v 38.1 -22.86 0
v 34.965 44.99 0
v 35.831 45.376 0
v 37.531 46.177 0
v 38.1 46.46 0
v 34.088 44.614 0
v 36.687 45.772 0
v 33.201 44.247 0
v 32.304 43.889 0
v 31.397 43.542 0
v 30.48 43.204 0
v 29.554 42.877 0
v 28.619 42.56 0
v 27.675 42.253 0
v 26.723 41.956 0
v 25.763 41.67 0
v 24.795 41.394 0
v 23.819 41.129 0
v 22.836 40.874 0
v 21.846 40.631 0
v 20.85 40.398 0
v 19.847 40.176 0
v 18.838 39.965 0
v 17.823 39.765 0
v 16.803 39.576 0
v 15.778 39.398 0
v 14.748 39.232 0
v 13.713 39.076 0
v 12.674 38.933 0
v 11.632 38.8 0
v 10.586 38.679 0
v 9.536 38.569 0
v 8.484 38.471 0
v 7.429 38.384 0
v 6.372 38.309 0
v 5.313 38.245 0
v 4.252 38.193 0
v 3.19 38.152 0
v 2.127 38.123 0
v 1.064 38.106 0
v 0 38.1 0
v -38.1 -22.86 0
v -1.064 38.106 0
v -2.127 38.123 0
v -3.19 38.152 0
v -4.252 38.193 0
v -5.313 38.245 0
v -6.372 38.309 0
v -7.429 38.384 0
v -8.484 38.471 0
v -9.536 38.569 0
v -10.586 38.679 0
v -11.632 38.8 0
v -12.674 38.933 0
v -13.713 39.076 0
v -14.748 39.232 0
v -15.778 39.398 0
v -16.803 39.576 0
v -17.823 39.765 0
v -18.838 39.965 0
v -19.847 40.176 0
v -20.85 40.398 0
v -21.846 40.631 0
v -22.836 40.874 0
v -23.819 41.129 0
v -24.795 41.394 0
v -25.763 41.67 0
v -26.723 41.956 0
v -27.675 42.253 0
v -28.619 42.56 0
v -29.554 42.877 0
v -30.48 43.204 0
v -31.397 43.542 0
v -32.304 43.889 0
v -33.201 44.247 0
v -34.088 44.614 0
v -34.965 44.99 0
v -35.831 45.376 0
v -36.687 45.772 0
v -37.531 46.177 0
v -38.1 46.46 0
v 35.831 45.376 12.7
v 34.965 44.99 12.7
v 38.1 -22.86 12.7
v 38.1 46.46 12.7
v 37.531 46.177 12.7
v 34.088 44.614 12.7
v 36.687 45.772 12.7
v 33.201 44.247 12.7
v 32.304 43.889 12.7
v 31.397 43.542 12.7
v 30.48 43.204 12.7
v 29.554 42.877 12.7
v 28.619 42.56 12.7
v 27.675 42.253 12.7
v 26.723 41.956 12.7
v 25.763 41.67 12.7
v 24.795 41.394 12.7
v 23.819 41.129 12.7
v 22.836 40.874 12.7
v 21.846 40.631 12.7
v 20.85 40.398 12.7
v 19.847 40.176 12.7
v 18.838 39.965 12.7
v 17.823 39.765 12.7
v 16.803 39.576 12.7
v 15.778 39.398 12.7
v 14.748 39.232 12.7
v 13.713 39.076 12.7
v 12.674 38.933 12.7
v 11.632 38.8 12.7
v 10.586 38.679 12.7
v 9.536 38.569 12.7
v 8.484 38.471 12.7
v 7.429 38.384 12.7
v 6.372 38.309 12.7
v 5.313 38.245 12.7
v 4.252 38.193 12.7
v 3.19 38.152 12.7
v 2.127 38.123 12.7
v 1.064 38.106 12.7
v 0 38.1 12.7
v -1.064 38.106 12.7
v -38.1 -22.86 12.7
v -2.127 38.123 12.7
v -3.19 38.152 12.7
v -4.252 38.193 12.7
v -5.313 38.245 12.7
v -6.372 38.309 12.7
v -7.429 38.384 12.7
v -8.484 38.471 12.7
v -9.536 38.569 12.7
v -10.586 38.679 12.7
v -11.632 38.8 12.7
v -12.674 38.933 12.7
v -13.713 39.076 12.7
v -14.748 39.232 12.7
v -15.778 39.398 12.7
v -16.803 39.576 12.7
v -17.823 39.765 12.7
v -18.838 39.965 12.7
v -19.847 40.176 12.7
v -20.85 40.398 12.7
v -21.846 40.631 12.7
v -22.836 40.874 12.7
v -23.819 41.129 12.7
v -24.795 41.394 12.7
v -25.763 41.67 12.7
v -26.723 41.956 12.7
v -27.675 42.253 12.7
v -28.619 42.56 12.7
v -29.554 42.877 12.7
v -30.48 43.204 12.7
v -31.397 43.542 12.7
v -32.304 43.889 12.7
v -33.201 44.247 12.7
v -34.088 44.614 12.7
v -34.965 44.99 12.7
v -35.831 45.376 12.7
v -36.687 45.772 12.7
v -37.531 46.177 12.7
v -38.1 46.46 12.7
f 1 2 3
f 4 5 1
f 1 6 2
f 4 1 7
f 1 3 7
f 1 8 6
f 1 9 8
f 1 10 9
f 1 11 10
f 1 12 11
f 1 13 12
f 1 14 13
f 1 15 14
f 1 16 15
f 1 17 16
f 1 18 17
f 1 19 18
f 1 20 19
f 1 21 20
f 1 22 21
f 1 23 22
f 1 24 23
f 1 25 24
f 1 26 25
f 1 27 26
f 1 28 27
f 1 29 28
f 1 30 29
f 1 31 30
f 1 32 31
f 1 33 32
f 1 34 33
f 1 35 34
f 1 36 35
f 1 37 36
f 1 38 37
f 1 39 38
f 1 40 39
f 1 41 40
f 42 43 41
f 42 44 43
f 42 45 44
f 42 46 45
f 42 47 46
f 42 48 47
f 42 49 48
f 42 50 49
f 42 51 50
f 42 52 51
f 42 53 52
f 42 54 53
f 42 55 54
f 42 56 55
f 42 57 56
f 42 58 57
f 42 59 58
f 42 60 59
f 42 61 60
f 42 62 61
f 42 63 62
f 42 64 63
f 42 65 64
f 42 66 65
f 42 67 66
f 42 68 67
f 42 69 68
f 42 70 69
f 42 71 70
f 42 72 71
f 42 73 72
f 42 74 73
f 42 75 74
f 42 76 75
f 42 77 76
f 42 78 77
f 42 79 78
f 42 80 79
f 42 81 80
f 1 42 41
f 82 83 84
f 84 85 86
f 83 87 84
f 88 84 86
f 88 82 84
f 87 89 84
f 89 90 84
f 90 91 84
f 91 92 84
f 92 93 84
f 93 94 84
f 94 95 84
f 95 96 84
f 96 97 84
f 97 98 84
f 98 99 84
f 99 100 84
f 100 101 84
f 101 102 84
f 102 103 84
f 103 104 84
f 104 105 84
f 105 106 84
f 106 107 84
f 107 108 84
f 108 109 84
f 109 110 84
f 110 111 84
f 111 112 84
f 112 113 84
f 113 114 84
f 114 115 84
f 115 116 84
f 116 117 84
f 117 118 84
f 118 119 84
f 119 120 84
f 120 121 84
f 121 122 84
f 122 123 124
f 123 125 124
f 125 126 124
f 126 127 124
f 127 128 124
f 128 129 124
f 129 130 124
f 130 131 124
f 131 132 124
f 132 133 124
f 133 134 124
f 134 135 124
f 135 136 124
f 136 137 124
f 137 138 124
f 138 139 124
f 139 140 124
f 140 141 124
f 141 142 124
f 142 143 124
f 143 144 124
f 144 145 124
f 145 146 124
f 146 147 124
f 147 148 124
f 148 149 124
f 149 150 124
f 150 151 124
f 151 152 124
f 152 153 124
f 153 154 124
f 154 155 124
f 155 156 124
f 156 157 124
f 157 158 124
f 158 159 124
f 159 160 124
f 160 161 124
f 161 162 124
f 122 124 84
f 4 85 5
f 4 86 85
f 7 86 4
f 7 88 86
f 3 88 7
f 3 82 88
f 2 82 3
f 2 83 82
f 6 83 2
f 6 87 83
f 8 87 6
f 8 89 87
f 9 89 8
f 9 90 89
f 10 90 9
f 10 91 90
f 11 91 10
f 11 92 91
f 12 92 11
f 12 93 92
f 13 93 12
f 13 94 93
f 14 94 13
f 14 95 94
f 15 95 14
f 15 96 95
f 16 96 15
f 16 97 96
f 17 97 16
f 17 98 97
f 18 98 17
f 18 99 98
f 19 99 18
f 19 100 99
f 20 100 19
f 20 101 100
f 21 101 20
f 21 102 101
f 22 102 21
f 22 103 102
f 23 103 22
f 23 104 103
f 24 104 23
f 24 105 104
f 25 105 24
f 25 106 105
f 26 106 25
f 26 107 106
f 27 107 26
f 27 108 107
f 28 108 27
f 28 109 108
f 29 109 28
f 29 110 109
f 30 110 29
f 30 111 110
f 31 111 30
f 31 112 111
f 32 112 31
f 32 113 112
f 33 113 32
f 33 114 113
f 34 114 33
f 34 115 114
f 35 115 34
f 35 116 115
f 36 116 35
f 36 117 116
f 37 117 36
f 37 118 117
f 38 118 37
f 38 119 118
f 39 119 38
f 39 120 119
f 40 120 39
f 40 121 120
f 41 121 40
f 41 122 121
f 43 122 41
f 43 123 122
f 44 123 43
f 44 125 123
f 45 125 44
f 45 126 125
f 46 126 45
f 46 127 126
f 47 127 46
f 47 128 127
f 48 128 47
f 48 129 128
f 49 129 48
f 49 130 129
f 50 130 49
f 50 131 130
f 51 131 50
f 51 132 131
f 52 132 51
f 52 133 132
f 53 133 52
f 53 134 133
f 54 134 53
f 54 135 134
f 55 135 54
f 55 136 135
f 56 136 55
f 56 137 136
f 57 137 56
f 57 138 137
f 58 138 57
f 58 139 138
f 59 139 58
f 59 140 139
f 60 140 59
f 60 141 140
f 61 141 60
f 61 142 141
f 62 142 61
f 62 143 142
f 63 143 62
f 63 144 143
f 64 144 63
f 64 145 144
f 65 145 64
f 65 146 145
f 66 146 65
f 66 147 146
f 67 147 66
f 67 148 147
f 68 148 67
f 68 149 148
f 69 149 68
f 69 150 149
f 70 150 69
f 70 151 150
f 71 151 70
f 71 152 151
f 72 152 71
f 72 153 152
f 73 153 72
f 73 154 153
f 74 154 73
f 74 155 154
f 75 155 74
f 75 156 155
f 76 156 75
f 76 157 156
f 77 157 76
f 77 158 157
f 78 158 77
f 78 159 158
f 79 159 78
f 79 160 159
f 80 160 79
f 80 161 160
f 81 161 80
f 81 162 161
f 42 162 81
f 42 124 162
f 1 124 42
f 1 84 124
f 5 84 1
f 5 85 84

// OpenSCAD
$fa = 1;
$fs = 0.4;

size_factor = 25.4;
spacer_depth = 3 * size_factor;
spacer_width = 3 * size_factor;
spacer_height = 0.5 * size_factor;
y_offset = spacer_depth * 0.2;

circle_y_offset = spacer_width * 2;

linear_extrude(height=spacer_height)
    difference(){
        translate([0,y_offset,0]) 
        square([spacer_depth,spacer_width],center = true);
        
        scale([0.8,.5,1])
        translate([0,circle_y_offset,0])
        circle(spacer_width);
        
}
